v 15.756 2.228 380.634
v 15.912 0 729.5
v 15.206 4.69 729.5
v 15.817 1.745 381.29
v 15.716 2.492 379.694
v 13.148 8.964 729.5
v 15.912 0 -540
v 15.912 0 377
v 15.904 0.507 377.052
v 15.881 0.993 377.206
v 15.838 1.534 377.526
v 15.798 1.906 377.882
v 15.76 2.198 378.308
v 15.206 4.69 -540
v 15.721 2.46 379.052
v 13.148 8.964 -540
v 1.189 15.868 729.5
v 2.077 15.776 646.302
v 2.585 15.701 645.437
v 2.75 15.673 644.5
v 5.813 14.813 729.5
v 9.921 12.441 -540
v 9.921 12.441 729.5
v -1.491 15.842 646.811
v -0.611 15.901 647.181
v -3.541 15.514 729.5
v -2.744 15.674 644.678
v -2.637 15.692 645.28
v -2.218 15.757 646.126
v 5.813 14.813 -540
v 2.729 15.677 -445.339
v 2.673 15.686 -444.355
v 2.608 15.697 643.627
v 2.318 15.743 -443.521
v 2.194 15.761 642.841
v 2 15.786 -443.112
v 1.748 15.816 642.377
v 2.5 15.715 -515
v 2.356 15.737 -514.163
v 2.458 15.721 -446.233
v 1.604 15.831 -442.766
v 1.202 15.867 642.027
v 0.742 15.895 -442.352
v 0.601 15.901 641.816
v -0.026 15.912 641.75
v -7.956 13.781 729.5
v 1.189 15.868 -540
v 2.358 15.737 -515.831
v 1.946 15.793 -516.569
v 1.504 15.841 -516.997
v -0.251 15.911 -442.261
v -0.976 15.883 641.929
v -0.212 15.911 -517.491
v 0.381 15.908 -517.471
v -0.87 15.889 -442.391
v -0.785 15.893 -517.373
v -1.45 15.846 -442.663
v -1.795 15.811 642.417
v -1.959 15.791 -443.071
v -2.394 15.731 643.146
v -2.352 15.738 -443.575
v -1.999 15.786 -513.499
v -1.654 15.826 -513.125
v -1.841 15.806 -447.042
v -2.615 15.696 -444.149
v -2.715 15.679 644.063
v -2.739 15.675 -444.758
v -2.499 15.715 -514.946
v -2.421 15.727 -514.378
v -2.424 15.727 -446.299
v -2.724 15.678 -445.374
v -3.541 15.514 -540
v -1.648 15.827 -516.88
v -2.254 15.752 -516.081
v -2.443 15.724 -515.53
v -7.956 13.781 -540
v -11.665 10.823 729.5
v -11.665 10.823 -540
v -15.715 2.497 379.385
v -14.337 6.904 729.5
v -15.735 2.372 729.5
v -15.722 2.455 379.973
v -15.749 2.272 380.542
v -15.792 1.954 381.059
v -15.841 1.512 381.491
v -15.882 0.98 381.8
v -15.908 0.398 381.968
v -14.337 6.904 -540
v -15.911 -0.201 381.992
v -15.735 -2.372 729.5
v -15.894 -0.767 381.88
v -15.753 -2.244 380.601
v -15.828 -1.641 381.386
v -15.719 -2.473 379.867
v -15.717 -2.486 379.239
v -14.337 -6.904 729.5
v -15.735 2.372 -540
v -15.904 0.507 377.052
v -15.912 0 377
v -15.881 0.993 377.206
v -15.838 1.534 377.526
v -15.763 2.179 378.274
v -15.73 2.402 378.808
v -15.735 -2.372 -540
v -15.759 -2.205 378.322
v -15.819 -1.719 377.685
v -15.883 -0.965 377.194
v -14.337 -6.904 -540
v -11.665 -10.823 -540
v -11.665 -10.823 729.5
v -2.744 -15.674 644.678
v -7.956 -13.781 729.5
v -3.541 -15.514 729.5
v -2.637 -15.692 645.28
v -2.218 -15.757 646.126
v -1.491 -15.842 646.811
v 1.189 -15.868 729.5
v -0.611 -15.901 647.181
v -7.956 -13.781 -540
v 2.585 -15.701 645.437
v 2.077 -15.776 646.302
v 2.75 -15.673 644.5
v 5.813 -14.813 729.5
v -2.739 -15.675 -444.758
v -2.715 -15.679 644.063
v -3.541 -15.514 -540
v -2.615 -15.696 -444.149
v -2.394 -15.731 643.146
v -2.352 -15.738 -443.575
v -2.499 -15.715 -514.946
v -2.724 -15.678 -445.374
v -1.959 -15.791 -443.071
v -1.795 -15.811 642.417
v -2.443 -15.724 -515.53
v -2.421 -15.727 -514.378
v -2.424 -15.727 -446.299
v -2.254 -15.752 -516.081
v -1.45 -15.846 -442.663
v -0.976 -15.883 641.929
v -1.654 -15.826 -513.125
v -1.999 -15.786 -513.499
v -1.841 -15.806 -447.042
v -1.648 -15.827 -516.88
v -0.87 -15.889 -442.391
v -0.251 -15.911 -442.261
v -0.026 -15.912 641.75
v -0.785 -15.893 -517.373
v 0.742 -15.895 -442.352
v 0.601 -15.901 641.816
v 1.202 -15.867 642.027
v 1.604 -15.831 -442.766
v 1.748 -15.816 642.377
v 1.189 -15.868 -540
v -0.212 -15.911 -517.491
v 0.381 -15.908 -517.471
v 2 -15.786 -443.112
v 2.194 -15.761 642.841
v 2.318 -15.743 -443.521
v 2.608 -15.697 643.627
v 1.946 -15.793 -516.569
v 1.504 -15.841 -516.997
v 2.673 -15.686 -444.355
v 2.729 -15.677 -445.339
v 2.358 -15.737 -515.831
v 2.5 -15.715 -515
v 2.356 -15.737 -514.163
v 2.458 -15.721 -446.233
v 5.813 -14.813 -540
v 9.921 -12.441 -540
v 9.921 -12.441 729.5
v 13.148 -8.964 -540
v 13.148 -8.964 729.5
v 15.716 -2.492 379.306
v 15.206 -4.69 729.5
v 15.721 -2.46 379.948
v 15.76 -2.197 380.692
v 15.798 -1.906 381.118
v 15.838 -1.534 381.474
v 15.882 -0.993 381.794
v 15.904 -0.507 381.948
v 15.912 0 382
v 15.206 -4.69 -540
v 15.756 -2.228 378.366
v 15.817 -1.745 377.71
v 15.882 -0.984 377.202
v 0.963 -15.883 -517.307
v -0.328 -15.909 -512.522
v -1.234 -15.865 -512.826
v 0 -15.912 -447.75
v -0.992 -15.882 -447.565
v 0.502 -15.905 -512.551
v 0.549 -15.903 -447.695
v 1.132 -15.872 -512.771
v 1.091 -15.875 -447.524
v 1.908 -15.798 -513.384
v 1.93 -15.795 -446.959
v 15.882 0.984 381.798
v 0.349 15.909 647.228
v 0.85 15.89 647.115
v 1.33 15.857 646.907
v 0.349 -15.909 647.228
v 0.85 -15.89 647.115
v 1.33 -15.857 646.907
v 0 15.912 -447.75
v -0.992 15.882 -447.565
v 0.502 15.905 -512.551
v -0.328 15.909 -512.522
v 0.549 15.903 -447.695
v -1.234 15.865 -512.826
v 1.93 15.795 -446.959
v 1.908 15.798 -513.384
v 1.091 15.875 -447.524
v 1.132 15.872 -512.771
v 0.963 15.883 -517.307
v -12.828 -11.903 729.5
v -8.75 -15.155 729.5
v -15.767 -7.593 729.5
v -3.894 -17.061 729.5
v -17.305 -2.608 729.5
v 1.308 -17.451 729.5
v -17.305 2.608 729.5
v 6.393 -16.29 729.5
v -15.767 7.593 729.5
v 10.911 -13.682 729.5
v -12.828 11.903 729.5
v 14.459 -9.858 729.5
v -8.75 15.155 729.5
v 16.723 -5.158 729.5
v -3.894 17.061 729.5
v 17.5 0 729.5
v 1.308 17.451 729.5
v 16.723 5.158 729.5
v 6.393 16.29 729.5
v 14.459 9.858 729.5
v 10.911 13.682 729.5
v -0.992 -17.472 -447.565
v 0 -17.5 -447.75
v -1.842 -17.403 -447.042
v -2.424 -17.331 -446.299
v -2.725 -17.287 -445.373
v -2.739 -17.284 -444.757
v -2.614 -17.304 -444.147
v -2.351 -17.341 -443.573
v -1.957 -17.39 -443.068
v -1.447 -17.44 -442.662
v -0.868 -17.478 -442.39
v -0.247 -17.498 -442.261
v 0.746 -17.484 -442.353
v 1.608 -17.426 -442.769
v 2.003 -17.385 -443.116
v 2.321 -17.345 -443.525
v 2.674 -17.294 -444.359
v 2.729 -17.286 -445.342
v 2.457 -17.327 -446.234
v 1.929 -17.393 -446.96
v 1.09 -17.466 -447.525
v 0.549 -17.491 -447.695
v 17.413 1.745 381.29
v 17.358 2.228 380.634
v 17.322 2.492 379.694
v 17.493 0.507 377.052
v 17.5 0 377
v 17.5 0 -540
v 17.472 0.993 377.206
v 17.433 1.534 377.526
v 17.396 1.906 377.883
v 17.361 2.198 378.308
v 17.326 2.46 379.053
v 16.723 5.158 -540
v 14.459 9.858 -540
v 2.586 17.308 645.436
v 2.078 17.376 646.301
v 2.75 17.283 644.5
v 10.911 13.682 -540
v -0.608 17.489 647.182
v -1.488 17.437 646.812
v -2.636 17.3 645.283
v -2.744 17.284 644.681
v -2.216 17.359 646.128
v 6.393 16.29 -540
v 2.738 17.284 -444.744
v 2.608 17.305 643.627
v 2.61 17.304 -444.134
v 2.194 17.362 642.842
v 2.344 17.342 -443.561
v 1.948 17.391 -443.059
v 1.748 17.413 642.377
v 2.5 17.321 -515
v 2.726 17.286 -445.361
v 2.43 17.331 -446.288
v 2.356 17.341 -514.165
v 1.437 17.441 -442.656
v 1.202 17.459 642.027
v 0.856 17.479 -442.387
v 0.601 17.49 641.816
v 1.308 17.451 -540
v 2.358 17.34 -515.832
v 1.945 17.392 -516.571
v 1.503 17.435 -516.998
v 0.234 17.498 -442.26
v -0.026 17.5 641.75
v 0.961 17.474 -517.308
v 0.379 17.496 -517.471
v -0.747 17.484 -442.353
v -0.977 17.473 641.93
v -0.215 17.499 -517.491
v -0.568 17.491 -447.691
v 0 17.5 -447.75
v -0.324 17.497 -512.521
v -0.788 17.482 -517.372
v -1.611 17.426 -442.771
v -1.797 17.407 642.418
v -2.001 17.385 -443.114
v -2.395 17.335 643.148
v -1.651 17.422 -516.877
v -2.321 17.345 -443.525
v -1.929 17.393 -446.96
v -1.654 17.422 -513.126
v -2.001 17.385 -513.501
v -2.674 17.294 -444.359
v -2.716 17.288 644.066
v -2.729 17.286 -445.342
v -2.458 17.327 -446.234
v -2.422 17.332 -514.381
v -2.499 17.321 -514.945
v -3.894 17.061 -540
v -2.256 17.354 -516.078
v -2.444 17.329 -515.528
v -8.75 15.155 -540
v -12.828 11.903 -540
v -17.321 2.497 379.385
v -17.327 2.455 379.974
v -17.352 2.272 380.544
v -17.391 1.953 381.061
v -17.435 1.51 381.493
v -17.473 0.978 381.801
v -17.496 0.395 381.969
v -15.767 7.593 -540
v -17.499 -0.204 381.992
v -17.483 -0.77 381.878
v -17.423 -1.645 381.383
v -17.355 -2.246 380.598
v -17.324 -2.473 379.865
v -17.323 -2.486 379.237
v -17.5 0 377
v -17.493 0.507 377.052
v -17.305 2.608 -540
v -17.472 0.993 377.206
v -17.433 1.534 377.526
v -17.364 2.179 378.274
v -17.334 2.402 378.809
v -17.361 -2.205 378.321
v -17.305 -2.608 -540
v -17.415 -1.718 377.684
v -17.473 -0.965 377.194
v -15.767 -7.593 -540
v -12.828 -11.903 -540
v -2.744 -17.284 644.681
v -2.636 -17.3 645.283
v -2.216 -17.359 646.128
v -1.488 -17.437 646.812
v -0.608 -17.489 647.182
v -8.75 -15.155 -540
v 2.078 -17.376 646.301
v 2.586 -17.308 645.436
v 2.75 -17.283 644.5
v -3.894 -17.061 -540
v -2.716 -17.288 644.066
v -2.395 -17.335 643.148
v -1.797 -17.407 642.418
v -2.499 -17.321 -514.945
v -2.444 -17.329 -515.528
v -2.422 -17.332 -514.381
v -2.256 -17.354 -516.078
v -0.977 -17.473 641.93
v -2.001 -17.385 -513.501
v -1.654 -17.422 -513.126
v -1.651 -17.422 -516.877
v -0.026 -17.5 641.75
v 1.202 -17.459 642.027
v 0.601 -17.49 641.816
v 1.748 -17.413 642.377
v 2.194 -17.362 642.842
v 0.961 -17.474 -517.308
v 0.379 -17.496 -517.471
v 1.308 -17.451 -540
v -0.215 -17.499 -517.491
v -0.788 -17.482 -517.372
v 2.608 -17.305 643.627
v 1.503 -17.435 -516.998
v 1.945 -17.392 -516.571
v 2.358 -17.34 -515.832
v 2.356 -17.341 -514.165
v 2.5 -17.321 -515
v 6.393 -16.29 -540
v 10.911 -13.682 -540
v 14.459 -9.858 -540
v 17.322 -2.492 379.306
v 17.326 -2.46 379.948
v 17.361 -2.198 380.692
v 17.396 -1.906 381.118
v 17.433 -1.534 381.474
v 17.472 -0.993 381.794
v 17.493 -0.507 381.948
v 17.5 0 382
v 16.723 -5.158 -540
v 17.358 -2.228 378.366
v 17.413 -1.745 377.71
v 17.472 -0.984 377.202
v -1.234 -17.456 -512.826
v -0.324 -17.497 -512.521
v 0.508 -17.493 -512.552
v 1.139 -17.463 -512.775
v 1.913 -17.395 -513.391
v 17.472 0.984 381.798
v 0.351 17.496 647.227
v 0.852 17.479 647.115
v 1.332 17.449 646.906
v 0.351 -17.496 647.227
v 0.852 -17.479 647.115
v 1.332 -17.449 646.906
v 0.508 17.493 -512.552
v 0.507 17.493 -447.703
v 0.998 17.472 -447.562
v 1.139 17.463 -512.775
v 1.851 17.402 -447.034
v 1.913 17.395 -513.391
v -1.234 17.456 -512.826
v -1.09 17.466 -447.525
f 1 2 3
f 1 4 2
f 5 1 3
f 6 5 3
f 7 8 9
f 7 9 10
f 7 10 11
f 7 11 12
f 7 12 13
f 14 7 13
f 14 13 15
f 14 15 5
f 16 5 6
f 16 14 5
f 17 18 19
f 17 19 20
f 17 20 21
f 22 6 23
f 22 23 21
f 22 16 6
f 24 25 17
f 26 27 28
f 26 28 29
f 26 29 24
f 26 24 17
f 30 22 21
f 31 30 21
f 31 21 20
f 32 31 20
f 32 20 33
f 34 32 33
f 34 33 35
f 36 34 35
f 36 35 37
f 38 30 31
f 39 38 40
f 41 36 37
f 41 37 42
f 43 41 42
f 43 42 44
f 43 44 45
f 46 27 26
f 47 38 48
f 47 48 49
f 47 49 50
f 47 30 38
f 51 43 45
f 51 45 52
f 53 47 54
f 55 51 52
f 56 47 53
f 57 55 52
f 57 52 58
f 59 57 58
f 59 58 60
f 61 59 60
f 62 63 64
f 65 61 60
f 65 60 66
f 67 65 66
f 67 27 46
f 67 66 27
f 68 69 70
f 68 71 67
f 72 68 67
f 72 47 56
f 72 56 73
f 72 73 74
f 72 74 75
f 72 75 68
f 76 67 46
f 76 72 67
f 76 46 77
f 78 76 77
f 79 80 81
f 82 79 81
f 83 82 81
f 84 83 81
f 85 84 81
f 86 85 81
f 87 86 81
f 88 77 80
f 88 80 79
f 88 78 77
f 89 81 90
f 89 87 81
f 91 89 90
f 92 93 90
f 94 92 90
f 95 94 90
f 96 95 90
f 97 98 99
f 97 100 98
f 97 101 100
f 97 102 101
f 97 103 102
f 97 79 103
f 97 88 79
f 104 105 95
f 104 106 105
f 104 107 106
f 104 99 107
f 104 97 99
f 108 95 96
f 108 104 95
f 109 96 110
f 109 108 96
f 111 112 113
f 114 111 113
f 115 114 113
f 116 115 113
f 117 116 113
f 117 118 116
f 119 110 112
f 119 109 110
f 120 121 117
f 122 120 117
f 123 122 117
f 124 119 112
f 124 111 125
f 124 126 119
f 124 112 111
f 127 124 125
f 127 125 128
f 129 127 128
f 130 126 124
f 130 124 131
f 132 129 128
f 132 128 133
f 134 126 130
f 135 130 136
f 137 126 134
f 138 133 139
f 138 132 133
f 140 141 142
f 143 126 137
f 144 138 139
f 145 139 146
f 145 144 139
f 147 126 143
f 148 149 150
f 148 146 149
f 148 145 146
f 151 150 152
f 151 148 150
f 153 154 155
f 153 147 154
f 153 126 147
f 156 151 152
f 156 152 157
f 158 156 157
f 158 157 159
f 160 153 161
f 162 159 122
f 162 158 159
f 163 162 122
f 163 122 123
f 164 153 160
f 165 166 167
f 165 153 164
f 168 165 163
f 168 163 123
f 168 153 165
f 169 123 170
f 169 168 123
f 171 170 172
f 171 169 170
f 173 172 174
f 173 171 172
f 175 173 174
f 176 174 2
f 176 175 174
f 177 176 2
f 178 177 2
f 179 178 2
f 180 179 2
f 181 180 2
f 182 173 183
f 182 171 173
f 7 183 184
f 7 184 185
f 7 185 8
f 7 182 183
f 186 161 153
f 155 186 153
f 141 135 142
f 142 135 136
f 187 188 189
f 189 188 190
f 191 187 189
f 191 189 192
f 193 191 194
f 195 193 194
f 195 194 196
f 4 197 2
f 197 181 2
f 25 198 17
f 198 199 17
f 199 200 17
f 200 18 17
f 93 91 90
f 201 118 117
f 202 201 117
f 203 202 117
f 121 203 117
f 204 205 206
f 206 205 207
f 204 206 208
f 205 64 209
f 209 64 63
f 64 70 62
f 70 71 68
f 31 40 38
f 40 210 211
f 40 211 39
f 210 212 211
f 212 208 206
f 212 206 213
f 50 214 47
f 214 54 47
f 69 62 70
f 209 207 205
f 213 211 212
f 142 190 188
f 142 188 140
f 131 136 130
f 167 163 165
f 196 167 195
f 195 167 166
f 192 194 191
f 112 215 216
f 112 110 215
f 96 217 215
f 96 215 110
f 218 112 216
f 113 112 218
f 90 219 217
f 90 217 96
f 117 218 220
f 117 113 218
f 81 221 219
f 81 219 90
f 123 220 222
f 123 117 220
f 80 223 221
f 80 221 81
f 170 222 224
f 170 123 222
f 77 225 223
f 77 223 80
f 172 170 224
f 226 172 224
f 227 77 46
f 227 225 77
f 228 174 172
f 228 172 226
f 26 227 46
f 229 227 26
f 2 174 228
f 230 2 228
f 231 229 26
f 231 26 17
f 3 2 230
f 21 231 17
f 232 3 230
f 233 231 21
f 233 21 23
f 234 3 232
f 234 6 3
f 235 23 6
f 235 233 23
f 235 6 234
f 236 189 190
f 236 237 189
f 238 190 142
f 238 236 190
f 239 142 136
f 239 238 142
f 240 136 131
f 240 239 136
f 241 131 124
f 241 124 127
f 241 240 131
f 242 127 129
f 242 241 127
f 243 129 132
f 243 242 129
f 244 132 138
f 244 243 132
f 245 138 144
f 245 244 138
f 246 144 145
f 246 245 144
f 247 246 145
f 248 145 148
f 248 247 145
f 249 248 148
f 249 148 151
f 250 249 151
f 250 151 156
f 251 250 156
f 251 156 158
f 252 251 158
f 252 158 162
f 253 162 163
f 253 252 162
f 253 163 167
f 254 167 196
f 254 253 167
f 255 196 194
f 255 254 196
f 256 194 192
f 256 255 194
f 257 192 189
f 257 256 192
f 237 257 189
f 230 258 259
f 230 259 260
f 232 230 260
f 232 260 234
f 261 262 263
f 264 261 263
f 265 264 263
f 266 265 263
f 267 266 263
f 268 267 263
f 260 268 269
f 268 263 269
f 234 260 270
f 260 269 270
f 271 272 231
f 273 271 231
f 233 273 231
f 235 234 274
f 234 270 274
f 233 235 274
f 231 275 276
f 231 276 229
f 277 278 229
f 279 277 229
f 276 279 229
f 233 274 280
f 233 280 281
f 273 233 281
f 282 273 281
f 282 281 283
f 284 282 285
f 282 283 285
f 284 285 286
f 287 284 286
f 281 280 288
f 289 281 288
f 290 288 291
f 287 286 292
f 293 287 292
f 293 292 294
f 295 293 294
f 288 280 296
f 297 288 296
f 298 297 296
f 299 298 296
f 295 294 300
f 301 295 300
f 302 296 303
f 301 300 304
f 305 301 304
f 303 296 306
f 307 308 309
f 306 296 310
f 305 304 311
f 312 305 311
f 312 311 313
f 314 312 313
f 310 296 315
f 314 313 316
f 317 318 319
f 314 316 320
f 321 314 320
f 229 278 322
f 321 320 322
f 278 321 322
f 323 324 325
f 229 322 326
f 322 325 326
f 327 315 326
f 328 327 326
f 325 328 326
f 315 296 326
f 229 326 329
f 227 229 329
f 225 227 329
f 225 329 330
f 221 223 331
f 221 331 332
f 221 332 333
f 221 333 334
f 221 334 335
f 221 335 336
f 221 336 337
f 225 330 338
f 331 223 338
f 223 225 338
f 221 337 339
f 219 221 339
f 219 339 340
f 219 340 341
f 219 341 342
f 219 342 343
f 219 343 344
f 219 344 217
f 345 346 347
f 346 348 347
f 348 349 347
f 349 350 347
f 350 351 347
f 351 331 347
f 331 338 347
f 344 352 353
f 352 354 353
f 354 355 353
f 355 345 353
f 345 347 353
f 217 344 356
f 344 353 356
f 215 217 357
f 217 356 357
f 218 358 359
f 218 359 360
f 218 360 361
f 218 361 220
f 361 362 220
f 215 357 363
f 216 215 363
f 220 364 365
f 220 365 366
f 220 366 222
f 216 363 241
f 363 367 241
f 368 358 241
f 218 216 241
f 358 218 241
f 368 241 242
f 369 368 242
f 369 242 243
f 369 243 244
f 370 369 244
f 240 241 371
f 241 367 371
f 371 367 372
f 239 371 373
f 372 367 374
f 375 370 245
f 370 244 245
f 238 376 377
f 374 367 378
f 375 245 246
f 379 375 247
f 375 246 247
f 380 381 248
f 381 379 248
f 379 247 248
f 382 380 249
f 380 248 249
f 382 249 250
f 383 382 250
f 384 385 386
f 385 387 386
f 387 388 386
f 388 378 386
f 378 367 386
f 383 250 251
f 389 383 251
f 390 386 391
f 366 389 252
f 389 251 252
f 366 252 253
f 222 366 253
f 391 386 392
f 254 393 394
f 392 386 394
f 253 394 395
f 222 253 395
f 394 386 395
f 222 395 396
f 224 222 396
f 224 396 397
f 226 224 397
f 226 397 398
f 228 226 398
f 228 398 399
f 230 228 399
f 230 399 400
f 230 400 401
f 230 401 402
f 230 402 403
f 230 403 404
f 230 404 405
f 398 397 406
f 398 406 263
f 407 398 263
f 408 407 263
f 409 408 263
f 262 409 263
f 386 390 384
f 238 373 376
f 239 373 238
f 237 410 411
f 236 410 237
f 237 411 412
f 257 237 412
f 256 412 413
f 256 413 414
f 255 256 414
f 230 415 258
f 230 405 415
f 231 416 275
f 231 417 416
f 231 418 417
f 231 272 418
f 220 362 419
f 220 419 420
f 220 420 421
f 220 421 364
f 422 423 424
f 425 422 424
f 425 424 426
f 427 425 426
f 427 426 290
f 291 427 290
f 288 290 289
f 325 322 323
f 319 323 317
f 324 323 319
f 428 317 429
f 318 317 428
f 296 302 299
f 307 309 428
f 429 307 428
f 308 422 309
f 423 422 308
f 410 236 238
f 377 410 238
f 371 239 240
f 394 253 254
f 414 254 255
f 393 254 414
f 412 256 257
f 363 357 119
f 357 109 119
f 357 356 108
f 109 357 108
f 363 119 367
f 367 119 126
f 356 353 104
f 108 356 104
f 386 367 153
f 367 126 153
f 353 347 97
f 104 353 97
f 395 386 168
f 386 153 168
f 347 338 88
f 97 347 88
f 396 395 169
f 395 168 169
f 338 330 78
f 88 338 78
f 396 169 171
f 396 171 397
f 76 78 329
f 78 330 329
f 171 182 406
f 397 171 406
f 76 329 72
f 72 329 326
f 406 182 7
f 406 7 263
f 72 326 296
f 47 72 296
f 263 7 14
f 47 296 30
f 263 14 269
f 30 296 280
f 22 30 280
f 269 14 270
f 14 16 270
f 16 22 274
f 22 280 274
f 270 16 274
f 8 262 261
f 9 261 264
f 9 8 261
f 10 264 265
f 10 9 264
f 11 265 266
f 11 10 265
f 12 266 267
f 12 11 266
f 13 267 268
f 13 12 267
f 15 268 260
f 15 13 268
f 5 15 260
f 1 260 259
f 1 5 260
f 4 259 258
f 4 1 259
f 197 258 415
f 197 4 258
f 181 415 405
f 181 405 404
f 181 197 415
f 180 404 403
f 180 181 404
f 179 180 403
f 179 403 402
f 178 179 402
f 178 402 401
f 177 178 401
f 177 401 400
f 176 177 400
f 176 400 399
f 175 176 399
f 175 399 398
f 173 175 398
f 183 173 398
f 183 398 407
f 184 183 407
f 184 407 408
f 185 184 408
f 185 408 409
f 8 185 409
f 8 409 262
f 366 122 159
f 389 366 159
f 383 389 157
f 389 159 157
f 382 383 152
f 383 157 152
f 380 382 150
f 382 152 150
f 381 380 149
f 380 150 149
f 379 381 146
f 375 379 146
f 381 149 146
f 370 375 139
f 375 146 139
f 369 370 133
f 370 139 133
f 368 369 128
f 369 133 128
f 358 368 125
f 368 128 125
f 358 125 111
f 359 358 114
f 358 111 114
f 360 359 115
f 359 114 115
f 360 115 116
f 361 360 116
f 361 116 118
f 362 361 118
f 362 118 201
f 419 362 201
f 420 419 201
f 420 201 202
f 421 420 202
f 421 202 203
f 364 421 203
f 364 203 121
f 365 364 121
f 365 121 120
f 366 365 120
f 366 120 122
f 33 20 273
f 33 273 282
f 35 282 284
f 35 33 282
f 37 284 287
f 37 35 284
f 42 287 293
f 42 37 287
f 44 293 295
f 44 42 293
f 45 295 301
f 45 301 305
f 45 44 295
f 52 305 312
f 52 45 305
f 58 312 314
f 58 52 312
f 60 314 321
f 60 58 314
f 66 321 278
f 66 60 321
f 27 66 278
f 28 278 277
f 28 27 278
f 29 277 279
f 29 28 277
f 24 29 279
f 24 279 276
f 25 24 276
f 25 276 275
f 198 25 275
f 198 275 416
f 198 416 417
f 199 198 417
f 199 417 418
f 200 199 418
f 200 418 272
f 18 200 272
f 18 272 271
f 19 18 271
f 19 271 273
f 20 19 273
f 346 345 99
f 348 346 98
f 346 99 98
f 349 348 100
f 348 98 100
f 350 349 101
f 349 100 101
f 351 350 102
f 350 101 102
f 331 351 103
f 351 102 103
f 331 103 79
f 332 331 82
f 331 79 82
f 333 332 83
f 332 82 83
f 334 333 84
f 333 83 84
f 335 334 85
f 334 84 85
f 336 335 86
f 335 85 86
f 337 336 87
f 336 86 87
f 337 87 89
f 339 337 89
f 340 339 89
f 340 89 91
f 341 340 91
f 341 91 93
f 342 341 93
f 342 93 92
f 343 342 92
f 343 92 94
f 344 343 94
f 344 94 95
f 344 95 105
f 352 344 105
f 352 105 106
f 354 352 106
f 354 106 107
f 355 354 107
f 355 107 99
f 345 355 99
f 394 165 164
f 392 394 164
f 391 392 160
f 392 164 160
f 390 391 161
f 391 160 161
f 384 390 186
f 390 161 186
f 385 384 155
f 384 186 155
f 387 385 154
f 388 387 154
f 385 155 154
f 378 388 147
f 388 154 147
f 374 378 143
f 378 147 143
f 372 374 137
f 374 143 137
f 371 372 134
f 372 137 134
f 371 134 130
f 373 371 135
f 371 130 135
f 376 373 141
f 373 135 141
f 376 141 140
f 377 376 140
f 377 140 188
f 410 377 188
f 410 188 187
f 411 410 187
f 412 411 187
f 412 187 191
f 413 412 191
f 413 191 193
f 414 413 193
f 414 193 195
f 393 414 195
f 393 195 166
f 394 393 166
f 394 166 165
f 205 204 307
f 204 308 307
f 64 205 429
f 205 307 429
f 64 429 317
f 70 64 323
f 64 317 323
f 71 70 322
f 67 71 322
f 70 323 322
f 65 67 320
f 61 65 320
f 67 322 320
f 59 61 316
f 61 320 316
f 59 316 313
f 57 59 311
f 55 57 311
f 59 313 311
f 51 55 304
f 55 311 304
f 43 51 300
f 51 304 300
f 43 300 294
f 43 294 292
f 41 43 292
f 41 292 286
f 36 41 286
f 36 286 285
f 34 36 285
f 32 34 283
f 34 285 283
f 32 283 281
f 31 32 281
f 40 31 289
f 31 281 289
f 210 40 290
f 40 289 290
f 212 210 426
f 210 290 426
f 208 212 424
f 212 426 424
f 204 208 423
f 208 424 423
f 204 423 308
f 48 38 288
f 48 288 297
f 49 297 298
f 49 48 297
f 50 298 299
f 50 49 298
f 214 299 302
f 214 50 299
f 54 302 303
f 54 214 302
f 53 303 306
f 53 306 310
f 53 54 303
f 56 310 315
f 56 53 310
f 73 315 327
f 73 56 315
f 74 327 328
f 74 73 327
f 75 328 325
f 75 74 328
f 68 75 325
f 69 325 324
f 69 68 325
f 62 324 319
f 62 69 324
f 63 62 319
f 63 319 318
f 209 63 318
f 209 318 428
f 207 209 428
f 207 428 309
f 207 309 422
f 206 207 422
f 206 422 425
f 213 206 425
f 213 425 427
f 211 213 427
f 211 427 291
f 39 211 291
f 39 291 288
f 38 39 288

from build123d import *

# Parameters (mm, degrees)
SKETCH2_R               = 17.5
SKETCH2_R_2             = 15.9125
BOSS_EXTRUDE1_DEPTH     = 540
SKETCH6_W               = 2.75
SKETCH6_H               = 17.5
SKETCH7_R               = 17.5
SKETCH7_R_2             = 15.9125
BOSS_EXTRUDE2_DEPTH     = 130
SKETCH13_R              = 17.5
SKETCH13_R_2            = 15.9125
BOSS_EXTRUDE4_DEPTH     = 59.5
SKETCH12_R              = 2.75
CUT_EXTRUDE4_DEPTH      = 18.5000001
CUT_EXTRUDE4_DEPTH_BACK = 18.5000001
SKETCH14_R              = 2.5
CUT_EXTRUDE5_DEPTH      = 18.5000001
CUT_EXTRUDE5_DEPTH_BACK = 18.5000001
SKETCH15_R              = 2.5
CUT_EXTRUDE6_DEPTH      = 18.5000001
CUT_EXTRUDE6_DEPTH_BACK = 18.5000001


with BuildPart() as part:
    # Sketch2 → Boss-Extrude1 (new body, symmetric)
    with BuildSketch(Plane.XY):
        Circle(SKETCH2_R)
        Circle(SKETCH2_R_2, mode=Mode.SUBTRACT)
    extrude(amount=BOSS_EXTRUDE1_DEPTH, both=True)

    # Sketch6 → M5 Clearance Hole1 (revolve, cut)
    with BuildSketch(Plane(origin=(0, 0, -445), x_dir=(0, 0, -1), z_dir=(1, 0, 0))):
        with Locations((1.375, 8.75)):
            Rectangle(SKETCH6_W, SKETCH6_H)
    m5_clearance_hole1 = revolve(axis=Axis((0, -6.35, -445), (0, 1, 0)), mode=Mode.SUBTRACT)

    # Mirror1: M5 Clearance Hole1 across plane
    add(m5_clearance_hole1.mirror(Plane.ZX), mode=Mode.SUBTRACT)

    # Sketch7 → Boss-Extrude2 (add)
    with BuildSketch(Plane.XY.offset(540)):
        Circle(SKETCH7_R)
        Circle(SKETCH7_R_2, mode=Mode.SUBTRACT)
    extrude(amount=BOSS_EXTRUDE2_DEPTH)

    # Sketch13 → Boss-Extrude4 (add)
    with BuildSketch(Plane.XY.offset(670)):
        Circle(SKETCH13_R)
        Circle(SKETCH13_R_2, mode=Mode.SUBTRACT)
    extrude(amount=BOSS_EXTRUDE4_DEPTH)

    # Sketch12 → Cut-Extrude4 (cut, two sides)
    with BuildSketch(Plane(origin=(0, 0, 0), x_dir=(1, 0, 0), z_dir=(0, 1, 0))) as cut_extrude4_sk:
        with Locations((0, -644.5)):
            Circle(SKETCH12_R)
    extrude(amount=CUT_EXTRUDE4_DEPTH, mode=Mode.SUBTRACT)
    extrude(cut_extrude4_sk.sketch, amount=-CUT_EXTRUDE4_DEPTH_BACK, mode=Mode.SUBTRACT)

    # Sketch14 → Cut-Extrude5 (cut, two sides)
    with BuildSketch(Plane(origin=(0, 0, 0), x_dir=(1, 0, 0), z_dir=(0, 1, 0))) as cut_extrude5_sk:
        with Locations((0, 515)):
            Circle(SKETCH14_R)
    extrude(amount=CUT_EXTRUDE5_DEPTH, mode=Mode.SUBTRACT)
    extrude(cut_extrude5_sk.sketch, amount=-CUT_EXTRUDE5_DEPTH_BACK, mode=Mode.SUBTRACT)

    # Sketch15 → Cut-Extrude6 (cut, two sides)
    with BuildSketch(Plane(origin=(0, 0, 0), x_dir=(0, 0, -1), z_dir=(1, 0, 0))) as cut_extrude6_sk:
        with Locations((-379.5, 0)):
            Circle(SKETCH15_R)
    extrude(amount=CUT_EXTRUDE6_DEPTH, mode=Mode.SUBTRACT)
    extrude(cut_extrude6_sk.sketch, amount=-CUT_EXTRUDE6_DEPTH_BACK, mode=Mode.SUBTRACT)


solid = part.part
